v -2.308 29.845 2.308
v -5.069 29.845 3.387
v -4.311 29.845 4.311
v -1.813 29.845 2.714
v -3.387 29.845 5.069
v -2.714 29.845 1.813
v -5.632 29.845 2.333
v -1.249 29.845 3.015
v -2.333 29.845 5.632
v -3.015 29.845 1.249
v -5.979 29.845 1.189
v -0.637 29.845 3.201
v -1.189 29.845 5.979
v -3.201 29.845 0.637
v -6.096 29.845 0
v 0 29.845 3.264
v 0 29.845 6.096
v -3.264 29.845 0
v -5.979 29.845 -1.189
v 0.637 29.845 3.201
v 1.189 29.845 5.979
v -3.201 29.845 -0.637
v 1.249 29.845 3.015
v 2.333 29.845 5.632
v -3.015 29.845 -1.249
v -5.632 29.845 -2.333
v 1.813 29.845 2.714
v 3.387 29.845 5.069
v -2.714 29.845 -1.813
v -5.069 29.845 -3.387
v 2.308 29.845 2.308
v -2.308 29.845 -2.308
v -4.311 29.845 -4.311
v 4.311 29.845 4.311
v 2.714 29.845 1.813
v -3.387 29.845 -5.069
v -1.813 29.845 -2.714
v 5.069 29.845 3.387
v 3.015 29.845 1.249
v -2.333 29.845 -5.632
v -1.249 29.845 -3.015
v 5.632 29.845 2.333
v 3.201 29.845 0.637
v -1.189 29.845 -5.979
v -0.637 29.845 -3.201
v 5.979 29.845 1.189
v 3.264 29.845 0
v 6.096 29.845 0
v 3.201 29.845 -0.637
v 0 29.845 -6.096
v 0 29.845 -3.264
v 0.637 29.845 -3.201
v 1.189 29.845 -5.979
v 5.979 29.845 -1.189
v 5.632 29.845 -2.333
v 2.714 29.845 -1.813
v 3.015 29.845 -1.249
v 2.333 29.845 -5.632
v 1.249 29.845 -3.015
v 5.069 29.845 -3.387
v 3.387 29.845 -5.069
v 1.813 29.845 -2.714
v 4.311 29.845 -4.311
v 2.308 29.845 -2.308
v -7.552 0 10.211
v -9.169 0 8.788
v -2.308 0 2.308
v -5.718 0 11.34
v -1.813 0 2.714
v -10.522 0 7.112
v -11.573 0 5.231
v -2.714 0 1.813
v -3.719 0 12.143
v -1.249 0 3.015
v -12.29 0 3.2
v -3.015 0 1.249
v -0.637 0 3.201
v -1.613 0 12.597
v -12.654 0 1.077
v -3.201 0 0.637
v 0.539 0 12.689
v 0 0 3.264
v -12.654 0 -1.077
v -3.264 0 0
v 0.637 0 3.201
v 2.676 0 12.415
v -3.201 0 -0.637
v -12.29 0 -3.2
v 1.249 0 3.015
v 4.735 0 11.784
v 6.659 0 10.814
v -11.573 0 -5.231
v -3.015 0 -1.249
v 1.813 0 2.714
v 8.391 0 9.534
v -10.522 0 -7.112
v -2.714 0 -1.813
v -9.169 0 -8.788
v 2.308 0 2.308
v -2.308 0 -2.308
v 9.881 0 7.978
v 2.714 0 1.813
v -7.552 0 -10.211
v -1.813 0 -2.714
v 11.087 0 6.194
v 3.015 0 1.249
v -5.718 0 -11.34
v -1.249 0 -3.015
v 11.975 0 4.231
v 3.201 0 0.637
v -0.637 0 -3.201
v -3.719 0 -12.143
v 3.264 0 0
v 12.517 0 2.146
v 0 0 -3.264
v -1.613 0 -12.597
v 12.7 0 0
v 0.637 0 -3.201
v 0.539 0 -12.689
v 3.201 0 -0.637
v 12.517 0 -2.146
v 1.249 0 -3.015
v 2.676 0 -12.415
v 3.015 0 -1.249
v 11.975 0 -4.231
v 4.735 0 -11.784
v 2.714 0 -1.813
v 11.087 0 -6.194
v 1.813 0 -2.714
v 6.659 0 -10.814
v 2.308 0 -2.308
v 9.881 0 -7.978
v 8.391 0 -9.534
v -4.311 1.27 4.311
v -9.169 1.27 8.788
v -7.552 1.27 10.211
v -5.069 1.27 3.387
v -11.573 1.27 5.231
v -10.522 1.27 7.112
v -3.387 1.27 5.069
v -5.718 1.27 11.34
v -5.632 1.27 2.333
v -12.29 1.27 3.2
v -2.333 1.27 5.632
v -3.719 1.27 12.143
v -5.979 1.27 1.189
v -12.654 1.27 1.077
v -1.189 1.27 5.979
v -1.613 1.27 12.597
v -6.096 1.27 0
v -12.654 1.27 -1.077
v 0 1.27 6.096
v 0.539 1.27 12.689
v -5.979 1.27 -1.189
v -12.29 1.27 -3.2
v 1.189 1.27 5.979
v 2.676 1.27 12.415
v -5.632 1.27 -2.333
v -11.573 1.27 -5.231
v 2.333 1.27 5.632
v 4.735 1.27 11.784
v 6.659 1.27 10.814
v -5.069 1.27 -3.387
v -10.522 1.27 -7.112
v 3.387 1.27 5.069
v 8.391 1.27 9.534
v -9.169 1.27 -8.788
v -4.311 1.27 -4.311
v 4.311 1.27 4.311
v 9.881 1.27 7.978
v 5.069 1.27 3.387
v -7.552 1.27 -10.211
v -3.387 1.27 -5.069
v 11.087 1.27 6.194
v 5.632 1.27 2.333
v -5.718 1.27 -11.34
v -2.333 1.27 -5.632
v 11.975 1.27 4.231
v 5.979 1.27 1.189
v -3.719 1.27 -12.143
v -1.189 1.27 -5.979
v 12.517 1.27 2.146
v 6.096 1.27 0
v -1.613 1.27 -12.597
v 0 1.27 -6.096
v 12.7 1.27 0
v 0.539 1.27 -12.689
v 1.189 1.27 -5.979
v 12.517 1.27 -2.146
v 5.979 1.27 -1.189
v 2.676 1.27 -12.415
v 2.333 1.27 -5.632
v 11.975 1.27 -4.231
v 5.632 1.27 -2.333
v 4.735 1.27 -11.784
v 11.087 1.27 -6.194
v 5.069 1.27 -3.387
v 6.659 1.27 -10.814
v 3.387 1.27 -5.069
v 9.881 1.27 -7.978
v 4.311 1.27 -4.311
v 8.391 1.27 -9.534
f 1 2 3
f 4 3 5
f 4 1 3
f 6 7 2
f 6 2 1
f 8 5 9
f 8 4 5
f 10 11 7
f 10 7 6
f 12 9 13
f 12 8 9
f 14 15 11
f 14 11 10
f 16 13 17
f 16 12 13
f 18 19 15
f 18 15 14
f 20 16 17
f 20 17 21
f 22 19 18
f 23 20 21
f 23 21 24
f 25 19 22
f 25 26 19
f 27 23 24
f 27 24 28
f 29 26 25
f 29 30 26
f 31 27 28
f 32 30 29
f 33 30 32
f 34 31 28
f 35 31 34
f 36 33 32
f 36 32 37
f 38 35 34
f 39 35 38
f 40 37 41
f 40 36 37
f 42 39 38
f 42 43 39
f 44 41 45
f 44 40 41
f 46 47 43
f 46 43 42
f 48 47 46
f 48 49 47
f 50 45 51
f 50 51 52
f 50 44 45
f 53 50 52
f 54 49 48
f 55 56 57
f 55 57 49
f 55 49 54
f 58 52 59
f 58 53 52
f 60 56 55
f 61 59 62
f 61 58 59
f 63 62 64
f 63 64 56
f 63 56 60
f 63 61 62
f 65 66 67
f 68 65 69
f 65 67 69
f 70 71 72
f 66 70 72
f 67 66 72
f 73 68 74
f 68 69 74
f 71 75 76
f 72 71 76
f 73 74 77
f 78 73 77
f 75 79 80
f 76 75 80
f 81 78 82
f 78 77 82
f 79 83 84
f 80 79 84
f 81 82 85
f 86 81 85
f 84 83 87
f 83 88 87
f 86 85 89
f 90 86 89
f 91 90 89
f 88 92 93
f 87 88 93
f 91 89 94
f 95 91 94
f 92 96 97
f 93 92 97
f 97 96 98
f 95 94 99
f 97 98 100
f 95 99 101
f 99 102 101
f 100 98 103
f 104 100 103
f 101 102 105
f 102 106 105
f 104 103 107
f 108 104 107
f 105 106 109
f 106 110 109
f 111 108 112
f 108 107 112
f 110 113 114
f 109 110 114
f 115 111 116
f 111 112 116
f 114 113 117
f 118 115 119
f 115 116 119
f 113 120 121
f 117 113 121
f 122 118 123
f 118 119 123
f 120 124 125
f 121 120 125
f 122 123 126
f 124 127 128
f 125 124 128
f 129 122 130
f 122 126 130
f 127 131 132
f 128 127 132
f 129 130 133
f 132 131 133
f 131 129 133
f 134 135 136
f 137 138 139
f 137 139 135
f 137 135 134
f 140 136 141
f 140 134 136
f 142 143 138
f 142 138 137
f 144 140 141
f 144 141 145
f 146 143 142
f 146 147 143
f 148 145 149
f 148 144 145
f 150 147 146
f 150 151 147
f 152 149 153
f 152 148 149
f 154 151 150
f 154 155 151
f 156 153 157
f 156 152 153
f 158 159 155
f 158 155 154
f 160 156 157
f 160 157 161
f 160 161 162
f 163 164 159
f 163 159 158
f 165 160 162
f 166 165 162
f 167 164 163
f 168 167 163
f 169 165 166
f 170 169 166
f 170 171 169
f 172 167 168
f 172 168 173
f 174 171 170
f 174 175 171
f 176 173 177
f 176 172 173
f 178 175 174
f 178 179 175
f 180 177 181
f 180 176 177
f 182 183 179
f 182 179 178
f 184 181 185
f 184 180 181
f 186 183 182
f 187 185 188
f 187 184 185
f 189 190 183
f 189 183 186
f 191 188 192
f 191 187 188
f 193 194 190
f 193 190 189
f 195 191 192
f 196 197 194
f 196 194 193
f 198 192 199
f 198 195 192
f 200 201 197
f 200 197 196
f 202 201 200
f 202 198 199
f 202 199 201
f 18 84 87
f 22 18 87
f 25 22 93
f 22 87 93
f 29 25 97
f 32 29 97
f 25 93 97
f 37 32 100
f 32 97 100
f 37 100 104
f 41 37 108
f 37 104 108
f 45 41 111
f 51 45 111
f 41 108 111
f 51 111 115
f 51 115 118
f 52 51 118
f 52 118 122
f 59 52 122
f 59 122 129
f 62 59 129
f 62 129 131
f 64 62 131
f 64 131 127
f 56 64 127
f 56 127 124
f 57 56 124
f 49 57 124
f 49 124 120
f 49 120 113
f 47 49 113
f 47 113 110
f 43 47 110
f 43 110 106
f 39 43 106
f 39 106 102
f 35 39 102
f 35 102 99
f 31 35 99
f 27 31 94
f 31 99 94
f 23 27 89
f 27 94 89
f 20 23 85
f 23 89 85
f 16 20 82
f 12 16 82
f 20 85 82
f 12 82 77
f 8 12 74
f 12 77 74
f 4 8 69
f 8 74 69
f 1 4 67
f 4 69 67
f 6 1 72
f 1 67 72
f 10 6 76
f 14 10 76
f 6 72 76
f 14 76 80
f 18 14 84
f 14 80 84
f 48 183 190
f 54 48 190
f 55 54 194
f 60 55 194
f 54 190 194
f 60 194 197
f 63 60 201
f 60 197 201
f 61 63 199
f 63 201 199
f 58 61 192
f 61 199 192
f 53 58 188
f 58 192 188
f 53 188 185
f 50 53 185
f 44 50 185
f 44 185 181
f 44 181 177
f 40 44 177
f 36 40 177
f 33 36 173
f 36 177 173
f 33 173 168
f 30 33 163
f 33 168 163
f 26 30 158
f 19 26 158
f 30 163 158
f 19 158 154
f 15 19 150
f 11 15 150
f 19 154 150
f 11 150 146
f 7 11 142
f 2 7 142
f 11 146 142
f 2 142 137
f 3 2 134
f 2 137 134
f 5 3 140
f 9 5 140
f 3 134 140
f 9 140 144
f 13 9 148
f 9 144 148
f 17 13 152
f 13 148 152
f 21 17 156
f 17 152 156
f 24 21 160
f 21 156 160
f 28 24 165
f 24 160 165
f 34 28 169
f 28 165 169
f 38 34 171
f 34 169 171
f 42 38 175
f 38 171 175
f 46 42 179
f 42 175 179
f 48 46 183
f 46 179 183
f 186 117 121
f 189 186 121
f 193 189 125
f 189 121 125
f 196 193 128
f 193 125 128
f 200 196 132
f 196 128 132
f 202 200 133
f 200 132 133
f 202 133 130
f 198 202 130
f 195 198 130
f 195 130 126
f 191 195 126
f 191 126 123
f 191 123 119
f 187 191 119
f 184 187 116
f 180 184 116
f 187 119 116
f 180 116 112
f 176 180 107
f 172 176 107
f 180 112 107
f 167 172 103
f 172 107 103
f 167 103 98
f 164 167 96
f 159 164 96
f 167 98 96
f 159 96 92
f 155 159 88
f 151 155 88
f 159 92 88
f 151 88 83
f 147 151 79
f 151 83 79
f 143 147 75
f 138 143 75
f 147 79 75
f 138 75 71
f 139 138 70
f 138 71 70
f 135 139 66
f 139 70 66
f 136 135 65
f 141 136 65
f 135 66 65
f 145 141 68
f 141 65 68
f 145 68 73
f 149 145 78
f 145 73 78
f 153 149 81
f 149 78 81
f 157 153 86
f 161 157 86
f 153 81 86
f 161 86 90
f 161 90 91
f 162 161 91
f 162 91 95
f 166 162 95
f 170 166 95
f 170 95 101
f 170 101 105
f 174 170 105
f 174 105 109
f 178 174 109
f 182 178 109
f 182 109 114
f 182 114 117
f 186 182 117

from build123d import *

# Parameters (mm, degrees)
SKETCH1_R                = 12.7
BOSS_EXTRUDE1_DEPTH      = 1.27
SKETCH2_R                = 6.096
BOSS_EXTRUDE2_DEPTH      = 28.575
F_5_16_18_TAPPED_HOLE1_D = 6.5278


with BuildPart() as part:
    # Sketch1 → Boss-Extrude1 (new body)
    with BuildSketch(Plane(origin=(0, 0, 0), x_dir=(1, 0, 0), z_dir=(0, 1, 0))):
        Circle(SKETCH1_R)
    extrude(amount=BOSS_EXTRUDE1_DEPTH)

    # Sketch2 → Boss-Extrude2 (add)
    with BuildSketch(Plane(origin=(0, 1.27, 0), x_dir=(1, 0, 0), z_dir=(0, 1, 0))):
        Circle(SKETCH2_R)
    extrude(amount=BOSS_EXTRUDE2_DEPTH)

    # 5/16-18 Tapped Hole1 (through all)
    with Locations(Plane(origin=(0, 29.845, 0), x_dir=(1, 0, 0), z_dir=(0, 1, 0))):
        with Locations((0, 0)):
            Hole(F_5_16_18_TAPPED_HOLE1_D / 2)


solid = part.part
